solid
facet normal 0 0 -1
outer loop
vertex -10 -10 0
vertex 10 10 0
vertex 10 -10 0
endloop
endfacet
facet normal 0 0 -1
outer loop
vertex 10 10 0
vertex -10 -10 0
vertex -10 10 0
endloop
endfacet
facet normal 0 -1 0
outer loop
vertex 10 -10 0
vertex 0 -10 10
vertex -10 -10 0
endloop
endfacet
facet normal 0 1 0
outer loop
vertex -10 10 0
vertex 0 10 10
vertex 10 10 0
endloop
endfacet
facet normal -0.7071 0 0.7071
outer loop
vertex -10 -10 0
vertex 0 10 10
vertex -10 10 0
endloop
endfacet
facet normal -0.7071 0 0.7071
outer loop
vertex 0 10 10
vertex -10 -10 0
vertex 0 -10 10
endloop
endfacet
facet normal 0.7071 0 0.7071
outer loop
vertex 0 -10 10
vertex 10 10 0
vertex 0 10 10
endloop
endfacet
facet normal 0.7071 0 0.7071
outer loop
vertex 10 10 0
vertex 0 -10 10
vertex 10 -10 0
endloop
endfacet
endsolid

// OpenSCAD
/* Polyhedron */

polyhedron(
  [
    [-10, -10, 0], // point 0
    [10, -10, 0], // point 1
    [10, 10, 0], // point 2
    [-10, 10, 0], // point 3
    [0, -10, 10], // point 4
    [0, 10, 10] // point 5
  ],
  [
    [0, 1, 2, 3],
    [0, 4, 1],
    [2, 5, 3],
    [3, 5, 4, 0],
    [1, 4, 5, 2]
  ]
);
